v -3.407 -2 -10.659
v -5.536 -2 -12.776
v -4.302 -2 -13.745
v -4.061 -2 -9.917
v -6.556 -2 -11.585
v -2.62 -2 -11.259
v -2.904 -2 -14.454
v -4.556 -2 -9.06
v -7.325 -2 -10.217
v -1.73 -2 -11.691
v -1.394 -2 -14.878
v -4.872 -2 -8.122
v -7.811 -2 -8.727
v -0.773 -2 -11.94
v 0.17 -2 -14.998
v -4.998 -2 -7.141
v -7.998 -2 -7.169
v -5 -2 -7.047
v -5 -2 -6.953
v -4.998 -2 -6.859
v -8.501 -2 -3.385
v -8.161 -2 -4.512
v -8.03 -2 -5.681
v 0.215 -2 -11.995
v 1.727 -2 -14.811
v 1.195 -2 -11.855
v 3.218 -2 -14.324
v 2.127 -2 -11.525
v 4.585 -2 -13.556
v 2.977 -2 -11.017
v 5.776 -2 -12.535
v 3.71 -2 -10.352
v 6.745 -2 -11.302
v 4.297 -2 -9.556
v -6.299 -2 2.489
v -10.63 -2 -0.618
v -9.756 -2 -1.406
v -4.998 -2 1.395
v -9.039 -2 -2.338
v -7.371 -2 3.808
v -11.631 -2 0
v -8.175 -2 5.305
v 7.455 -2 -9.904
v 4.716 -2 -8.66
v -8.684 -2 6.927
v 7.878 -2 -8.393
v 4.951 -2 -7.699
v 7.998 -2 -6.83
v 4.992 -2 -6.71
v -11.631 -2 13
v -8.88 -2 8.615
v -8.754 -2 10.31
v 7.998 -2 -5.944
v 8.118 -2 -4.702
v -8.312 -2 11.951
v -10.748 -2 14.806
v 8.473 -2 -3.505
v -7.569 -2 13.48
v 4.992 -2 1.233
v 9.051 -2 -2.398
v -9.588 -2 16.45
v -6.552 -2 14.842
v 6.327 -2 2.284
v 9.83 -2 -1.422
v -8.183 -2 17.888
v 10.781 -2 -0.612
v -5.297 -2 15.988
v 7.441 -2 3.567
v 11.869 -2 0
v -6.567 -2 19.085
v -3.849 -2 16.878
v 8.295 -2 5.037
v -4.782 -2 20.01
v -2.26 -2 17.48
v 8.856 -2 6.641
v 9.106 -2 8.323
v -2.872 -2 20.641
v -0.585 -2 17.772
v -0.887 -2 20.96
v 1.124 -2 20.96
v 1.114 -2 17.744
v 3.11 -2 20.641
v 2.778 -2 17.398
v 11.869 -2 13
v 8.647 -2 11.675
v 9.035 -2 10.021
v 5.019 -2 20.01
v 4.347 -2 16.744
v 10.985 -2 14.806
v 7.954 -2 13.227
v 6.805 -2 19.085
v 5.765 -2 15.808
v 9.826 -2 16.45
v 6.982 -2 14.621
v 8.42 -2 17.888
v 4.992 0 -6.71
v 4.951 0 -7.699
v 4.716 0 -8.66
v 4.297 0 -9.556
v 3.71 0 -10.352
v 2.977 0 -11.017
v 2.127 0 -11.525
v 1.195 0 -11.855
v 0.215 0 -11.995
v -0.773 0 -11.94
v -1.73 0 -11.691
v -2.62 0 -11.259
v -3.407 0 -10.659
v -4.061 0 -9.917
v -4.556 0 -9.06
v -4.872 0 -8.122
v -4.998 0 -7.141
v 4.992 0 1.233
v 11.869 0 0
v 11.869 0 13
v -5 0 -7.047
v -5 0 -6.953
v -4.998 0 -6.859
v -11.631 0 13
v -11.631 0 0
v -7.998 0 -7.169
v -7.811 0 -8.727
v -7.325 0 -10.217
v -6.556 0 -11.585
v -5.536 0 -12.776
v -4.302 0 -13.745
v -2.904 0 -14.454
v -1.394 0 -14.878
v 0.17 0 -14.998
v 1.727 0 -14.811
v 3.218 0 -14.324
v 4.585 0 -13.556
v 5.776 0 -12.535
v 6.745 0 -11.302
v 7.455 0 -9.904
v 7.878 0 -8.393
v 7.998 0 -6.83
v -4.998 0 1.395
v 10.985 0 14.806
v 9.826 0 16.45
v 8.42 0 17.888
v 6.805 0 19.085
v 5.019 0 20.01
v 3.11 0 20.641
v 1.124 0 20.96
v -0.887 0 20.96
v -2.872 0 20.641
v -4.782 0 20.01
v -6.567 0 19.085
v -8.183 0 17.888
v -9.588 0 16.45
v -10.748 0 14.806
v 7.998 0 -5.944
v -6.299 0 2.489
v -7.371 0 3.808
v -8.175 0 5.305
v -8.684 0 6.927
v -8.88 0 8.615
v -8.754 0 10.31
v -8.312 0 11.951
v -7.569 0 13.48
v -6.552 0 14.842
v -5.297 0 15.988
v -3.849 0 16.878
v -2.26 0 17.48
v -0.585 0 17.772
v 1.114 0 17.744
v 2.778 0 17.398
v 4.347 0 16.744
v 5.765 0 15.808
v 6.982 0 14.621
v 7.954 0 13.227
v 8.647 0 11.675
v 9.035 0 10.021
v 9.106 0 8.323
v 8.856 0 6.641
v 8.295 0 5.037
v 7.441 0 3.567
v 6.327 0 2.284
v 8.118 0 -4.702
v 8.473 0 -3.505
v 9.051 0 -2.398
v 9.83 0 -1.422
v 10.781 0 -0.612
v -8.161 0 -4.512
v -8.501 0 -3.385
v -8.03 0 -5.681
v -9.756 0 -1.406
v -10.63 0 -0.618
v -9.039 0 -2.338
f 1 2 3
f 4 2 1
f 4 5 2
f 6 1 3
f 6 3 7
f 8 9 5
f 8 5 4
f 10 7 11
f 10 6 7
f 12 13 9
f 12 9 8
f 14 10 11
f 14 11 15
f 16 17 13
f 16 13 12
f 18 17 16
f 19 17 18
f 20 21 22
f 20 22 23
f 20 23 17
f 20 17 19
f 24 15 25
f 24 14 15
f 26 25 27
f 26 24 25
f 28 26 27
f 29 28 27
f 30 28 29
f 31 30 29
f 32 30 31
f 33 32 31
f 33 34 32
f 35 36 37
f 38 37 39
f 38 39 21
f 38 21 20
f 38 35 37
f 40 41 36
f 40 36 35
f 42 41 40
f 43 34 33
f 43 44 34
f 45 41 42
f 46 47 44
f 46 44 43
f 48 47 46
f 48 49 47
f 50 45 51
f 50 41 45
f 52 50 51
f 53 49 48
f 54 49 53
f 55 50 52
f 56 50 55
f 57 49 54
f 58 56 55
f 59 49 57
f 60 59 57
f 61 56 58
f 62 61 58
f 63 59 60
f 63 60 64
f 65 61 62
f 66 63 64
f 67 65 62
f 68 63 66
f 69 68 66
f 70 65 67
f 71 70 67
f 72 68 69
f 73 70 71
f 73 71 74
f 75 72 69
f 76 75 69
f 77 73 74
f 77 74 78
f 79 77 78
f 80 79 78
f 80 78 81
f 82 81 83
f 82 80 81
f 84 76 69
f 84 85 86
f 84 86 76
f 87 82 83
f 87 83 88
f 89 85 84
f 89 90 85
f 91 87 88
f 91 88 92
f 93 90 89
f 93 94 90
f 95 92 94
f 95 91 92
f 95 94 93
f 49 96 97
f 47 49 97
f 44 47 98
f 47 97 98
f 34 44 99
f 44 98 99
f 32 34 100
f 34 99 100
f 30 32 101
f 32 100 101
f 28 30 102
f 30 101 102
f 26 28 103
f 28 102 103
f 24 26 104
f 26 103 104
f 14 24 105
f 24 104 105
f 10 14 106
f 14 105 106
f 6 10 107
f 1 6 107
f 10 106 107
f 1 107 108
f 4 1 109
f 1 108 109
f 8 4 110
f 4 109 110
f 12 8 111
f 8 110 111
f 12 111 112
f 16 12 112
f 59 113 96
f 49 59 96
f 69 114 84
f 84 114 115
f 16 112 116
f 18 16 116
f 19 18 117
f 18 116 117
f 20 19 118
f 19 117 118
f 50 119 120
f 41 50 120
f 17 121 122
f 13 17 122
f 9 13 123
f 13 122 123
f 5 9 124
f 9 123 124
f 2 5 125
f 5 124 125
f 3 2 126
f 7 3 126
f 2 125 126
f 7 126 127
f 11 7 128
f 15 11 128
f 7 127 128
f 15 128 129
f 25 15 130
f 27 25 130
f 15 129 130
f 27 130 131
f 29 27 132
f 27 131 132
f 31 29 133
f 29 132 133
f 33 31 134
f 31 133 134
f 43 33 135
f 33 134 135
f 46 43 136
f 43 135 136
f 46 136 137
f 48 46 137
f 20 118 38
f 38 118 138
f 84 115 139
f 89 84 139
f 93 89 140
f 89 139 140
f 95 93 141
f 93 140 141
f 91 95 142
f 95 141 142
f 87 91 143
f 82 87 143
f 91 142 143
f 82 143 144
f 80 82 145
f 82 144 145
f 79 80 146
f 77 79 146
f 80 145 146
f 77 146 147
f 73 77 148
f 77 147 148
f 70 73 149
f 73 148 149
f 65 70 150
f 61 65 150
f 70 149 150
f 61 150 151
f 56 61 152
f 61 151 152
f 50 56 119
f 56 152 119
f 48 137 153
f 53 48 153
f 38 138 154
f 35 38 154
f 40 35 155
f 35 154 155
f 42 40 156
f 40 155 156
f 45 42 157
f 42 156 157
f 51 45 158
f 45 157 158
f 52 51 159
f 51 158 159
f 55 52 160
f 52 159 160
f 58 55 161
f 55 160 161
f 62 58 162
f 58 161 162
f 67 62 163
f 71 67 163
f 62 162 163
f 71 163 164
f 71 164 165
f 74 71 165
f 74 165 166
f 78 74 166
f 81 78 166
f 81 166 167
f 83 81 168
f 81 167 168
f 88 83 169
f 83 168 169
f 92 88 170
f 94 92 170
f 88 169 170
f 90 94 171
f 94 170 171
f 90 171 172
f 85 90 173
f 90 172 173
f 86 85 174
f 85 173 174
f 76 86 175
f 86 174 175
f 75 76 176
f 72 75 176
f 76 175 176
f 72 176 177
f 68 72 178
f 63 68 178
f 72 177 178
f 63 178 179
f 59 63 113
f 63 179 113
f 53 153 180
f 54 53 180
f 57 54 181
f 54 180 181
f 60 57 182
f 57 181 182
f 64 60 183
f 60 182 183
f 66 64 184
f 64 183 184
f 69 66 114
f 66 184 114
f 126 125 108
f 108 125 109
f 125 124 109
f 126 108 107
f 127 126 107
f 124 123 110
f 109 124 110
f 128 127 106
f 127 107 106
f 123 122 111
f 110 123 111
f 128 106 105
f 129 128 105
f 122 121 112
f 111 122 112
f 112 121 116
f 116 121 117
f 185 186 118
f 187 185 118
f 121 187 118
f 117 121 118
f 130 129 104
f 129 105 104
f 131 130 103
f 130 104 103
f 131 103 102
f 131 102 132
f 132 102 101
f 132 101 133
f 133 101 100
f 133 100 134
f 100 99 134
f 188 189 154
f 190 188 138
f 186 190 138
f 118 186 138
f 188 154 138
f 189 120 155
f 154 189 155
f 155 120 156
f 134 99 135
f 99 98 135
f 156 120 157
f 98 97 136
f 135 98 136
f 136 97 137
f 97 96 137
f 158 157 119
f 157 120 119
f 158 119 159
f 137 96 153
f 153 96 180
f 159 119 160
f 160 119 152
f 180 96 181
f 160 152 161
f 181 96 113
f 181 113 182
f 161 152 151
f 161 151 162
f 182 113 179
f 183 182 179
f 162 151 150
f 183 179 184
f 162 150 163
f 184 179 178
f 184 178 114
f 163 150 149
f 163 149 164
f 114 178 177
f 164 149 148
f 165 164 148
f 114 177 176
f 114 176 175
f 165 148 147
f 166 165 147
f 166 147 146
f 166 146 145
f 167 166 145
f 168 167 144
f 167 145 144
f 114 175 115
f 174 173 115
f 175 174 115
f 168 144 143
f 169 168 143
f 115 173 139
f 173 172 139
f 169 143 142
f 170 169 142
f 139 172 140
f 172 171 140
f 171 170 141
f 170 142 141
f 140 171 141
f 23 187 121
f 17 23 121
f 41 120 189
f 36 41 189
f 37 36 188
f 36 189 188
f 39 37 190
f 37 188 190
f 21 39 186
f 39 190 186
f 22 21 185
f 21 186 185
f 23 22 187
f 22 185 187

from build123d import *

# Parameters (mm, degrees)
F1_DEPTH    = 2
F2_T1_DEPTH = 2


# Not quite as in the source:
# - a fillet or chamfer that OpenCascade refuses, or shapes differently, is made with other operations: its cross-section is extruded or revolved along the edge and cut away or added


with BuildPart() as f1:
    # F0 (on Front) → F1 (new body)
    with BuildSketch(Plane.XZ):
        with BuildLine():
            Line((-11.6313876303, 13), (-11.6313876303, 0))
            Line((-11.6313876303, 0), (-8.150026169, 0))
            Line((-8.150026169, 0), (-7.9982068951, -7.1693707857))
            ThreePointArc((-7.9982068951, -7.1693707857), (0.1698610087, -14.9981964991), (7.998186073, -6.829648769))
            Line((7.998186073, -6.829648769), (7.998186073, 0))
            Line((7.998186073, 0), (11.8686123697, 0))
            Line((11.8686123697, 0), (11.8686123697, 13))
            ThreePointArc((11.8686123697, 13), (0.1186123697, 21), (-11.6313876303, 13))
        make_face()
        with BuildLine():
            ThreePointArc((-4.9980202119, -7.1406910146), (-5, -7), (-4.9980202119, -6.8593089854))
            Line((-4.9980202119, -6.8593089854), (-4.9980202119, 1.395497035))
            ThreePointArc((-4.9980202119, 1.395497035), (0.2650718597, 17.7983630087), (4.9915903324, 1.2329118096))
            Line((4.9915903324, 1.2329118096), (4.9915903324, -6.7101276944))
            ThreePointArc((4.9915903324, -6.7101276944), (0.2153056642, -11.9953621962), (-4.9980202119, -7.1406910146))
        make_face(mode=Mode.SUBTRACT)
    extrude(amount=F1_DEPTH)

    # F2: fillet of radius 6.5 on 2 edges, made by hand

    # F2_s2 → F2_t1 (join)
    with BuildSketch(Plane.XZ):
        with BuildLine():
            ThreePointArc((-11.6313876303, 0), (-9.0385133393, -2.3384510594), (-8.029721431, -5.6811579463))
            Line((-8.029721431, -5.6811579463), (-8.150026169, 0))
            Line((-8.150026169, 0), (-11.6313876303, 0))
        make_face()
        with BuildLine():
            ThreePointArc((7.998186073, -5.9443538033), (9.0510662344, -2.3976813538), (11.8686123697, 0))
            Line((11.8686123697, 0), (7.998186073, 0))
            Line((7.998186073, 0), (7.998186073, -5.9443538033))
        make_face()
    extrude(amount=F2_T1_DEPTH)


solid = f1.part
